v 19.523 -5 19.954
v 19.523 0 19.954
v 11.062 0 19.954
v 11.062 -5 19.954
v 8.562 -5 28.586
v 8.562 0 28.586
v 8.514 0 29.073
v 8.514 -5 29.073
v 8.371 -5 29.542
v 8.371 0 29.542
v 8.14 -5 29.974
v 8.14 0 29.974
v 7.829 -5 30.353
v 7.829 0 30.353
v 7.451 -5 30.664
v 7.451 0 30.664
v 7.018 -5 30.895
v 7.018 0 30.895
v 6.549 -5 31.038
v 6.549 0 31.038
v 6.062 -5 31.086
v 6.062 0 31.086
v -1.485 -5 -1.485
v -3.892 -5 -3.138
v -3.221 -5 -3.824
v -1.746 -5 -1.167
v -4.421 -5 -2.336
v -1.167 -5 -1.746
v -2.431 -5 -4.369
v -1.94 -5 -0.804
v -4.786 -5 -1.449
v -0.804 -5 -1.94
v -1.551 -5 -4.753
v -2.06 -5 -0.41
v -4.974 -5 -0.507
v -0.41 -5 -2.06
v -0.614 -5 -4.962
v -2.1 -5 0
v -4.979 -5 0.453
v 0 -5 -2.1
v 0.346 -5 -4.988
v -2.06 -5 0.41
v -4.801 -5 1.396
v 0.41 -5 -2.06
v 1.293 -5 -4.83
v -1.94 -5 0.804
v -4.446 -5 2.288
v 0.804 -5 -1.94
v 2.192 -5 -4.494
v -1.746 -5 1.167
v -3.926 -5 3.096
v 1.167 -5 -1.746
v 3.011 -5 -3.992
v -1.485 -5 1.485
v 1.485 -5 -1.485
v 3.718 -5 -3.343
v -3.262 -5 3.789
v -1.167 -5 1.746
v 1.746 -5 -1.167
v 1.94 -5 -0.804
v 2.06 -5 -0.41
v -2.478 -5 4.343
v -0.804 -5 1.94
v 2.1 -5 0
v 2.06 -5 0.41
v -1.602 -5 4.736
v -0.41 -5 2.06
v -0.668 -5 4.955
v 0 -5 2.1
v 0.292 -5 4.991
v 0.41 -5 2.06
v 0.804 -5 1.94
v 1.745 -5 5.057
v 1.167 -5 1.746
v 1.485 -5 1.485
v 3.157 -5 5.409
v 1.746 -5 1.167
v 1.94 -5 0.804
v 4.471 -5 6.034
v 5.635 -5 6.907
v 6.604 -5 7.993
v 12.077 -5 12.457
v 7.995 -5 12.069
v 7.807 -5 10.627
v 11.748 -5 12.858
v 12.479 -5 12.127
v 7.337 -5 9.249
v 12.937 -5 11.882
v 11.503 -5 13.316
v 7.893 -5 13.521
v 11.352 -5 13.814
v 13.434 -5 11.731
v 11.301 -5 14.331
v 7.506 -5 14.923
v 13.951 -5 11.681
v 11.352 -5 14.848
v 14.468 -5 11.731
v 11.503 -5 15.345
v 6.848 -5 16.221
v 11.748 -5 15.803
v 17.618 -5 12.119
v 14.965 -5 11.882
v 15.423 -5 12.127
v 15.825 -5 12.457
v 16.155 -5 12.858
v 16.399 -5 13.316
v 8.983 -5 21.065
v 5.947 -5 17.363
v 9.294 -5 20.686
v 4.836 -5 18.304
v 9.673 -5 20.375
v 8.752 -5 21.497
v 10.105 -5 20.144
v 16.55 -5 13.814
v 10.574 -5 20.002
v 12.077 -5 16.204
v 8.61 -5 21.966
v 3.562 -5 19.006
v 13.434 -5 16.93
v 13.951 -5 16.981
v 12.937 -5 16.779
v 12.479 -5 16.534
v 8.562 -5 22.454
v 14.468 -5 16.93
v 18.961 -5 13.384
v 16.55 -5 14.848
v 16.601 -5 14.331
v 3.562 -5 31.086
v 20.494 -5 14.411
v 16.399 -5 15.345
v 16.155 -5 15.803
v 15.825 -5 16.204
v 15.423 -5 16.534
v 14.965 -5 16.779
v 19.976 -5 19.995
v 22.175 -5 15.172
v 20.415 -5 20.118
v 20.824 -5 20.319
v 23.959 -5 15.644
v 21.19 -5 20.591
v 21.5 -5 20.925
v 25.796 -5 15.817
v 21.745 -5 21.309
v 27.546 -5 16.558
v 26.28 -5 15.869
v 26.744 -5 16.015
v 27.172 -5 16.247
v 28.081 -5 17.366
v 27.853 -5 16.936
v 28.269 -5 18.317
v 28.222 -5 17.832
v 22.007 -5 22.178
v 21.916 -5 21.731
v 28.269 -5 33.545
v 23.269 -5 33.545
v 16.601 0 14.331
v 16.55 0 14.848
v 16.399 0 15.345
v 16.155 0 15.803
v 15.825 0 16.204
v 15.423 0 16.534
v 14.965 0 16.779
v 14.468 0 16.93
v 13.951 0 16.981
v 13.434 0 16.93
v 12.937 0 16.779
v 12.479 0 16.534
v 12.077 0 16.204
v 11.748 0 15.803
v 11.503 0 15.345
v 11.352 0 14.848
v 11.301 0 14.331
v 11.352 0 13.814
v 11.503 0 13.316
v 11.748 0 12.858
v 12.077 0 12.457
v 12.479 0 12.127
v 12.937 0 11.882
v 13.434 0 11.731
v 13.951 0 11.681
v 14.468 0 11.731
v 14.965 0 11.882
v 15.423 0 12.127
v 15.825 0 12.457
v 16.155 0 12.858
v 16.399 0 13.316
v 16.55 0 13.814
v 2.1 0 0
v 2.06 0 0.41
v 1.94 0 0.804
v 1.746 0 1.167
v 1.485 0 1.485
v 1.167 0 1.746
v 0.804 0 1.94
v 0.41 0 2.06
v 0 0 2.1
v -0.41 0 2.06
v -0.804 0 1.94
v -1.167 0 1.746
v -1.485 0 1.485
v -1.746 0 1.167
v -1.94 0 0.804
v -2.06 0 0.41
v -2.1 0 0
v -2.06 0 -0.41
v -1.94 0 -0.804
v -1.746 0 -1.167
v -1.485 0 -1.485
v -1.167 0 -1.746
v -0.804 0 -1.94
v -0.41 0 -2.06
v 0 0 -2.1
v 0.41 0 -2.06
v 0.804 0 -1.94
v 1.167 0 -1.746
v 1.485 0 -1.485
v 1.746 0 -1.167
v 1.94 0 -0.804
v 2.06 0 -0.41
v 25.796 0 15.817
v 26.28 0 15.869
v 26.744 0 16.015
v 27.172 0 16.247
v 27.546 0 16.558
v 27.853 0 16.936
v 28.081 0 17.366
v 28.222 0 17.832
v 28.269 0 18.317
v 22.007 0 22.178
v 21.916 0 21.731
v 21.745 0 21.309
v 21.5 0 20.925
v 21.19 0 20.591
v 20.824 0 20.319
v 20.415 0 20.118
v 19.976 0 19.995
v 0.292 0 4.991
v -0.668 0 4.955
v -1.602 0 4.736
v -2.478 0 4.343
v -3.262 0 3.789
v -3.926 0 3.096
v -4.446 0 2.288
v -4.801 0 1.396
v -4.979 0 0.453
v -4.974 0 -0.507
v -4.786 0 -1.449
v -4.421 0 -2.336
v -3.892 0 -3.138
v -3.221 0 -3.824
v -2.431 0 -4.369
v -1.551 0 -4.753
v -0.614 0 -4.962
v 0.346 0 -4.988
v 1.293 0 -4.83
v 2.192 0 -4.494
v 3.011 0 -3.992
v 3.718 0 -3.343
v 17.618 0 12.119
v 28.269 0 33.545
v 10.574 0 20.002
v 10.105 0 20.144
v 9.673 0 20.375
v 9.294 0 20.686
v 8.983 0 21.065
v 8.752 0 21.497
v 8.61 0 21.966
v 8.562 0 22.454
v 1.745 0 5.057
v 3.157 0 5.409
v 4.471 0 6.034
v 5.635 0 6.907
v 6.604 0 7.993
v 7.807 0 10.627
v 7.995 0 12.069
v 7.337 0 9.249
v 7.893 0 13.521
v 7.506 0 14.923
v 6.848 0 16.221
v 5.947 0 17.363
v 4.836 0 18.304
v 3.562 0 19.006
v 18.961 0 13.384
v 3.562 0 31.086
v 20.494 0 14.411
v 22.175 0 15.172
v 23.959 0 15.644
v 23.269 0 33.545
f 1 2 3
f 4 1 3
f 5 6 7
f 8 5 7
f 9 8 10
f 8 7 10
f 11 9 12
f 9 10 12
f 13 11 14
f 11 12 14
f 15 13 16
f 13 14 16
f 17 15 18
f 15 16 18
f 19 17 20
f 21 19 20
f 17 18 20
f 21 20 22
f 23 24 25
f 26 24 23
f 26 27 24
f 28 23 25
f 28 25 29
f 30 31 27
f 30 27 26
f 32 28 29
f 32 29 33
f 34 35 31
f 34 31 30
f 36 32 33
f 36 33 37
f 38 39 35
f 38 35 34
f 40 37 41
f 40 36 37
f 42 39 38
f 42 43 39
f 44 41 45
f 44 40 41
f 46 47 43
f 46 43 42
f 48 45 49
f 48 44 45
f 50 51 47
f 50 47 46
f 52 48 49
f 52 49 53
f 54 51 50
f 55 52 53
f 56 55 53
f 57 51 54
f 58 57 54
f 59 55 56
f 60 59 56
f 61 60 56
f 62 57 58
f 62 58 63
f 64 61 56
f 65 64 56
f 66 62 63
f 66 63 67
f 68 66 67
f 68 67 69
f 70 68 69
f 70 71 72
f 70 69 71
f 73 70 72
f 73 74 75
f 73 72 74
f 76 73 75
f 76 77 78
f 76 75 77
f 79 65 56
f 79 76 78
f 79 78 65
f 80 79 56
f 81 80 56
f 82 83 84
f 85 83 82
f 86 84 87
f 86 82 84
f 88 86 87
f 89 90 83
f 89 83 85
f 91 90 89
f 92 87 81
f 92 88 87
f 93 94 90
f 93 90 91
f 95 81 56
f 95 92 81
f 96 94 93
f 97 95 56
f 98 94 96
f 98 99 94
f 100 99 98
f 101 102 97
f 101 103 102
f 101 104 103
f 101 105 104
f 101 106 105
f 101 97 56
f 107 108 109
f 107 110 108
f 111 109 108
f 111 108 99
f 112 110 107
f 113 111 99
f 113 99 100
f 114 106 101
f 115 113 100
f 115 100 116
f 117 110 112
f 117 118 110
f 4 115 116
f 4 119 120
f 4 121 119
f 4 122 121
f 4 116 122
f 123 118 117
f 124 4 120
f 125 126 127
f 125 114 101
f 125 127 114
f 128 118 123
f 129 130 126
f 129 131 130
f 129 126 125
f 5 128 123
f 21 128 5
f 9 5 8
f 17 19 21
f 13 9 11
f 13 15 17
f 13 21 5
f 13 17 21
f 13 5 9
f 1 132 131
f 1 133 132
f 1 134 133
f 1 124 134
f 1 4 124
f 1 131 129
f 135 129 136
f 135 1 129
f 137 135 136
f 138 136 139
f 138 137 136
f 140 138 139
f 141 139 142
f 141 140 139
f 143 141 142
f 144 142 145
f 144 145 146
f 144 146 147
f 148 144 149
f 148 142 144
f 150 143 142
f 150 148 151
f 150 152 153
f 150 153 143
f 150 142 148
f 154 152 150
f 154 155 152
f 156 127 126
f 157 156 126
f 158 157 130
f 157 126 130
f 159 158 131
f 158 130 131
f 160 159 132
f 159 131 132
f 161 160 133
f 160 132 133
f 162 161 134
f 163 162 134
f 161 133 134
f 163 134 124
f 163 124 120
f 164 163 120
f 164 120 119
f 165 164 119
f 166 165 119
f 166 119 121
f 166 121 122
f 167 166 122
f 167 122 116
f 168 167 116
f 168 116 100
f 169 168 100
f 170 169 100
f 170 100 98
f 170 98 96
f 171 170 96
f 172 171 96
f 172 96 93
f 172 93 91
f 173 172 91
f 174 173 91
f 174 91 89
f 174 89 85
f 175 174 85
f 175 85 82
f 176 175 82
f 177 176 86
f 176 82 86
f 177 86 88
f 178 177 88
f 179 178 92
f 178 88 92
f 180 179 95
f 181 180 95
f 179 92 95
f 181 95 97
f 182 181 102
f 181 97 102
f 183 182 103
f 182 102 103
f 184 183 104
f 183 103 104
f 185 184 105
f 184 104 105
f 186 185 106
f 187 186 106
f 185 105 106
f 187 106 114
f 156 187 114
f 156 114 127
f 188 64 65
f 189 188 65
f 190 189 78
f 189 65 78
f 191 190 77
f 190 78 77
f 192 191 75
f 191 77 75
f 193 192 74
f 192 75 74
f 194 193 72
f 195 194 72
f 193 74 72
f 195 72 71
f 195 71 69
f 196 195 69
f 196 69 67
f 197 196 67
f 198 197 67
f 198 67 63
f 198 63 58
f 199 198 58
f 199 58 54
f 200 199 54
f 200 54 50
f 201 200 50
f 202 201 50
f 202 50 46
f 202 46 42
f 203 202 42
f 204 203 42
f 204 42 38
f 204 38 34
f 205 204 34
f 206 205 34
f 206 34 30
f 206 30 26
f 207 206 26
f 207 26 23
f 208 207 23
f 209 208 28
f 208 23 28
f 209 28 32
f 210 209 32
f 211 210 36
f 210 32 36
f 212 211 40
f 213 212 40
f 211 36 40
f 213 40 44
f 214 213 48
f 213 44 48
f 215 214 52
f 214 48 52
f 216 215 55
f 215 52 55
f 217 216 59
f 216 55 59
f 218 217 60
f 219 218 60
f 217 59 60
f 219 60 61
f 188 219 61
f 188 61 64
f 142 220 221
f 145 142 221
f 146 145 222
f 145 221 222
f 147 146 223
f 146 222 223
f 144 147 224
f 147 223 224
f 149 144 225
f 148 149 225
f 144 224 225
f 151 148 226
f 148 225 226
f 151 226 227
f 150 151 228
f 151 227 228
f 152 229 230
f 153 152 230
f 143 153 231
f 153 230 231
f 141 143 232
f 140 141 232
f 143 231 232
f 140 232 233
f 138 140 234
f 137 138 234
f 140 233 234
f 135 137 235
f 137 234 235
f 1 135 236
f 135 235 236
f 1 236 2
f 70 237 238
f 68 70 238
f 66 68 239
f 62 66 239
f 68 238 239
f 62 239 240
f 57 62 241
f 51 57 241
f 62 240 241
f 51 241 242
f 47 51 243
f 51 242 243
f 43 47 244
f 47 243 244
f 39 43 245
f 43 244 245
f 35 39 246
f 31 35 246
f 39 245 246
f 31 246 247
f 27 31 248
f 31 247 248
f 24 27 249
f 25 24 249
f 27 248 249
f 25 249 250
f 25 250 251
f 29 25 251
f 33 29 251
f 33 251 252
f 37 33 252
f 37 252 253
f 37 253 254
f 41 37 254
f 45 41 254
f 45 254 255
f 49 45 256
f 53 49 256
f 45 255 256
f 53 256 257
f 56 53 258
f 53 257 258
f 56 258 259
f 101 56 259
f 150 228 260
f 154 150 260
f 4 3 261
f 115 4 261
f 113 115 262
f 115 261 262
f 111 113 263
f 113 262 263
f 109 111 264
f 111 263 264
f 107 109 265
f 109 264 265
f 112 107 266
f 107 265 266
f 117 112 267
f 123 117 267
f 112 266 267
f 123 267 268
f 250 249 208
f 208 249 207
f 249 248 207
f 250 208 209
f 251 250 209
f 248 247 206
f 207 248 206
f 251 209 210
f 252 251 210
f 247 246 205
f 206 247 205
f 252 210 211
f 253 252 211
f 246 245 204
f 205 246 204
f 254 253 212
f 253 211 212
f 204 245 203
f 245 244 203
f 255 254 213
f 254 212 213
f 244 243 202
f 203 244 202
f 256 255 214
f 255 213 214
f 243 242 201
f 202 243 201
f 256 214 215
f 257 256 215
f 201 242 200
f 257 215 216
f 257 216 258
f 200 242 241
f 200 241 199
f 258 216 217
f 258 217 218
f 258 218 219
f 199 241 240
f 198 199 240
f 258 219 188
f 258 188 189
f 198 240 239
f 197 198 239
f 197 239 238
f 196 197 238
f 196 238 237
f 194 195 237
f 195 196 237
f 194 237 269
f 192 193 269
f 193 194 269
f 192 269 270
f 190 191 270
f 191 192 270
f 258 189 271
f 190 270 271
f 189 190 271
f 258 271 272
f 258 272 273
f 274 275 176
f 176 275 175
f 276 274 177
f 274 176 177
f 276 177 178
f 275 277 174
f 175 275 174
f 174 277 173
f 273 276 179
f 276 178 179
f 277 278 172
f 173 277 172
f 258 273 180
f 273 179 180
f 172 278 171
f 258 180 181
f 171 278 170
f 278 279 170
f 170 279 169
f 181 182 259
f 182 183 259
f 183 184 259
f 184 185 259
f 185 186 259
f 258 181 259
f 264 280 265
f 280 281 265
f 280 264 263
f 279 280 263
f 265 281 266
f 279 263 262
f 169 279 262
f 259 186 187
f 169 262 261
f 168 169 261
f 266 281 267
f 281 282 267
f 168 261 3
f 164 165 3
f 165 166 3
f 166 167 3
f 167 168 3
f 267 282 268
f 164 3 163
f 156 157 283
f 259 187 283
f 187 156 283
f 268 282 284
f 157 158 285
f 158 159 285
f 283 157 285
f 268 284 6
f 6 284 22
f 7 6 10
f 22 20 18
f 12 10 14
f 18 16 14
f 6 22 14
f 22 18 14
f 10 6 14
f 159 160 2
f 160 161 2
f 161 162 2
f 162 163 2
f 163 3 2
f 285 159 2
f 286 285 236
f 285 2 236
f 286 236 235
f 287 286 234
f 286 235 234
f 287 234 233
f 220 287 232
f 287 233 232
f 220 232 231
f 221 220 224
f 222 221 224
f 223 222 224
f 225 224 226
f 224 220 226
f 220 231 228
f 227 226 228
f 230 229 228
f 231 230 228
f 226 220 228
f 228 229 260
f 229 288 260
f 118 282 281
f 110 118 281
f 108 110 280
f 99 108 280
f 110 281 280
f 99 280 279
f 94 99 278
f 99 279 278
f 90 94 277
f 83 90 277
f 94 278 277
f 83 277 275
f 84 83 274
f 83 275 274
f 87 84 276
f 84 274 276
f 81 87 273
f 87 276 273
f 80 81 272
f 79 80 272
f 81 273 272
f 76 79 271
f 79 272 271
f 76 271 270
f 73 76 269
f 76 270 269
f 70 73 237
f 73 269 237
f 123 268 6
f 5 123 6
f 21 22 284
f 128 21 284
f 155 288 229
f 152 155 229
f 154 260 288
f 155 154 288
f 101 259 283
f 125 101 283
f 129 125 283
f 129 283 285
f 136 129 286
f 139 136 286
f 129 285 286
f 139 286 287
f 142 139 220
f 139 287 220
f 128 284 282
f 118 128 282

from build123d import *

# Parameters (mm, degrees)
BOSS_EXTRUDE1_DEPTH  = 5
M5_CLEARANCE_HOLE1_D = 5.3
M5_TAPPED_HOLE1_D    = 4.2


with BuildPart() as part:
    # Sketch3 → Boss-Extrude1 (new body)
    with BuildSketch(Plane(origin=(0, 0, 0), x_dir=(-1, 0, 0), z_dir=(0, 1, 0))):
        with BuildLine():
            Line((-3.718320572, -3.342767136), (-17.618374366, 12.118930874))
            ThreePointArc((-17.618374366, 12.118930874), (-21.319064477, 14.826224184), (-25.796067121, 15.816674432))
            ThreePointArc((-25.796067121, 15.816674432), (-27.546375819, 16.558322133), (-28.269100189, 18.316528984))
            Line((-28.269100189, 18.316528984), (-28.269100189, 33.544684312))
            Line((-28.269100189, 33.544684312), (-23.269100189, 33.544684312))
            Line((-23.269100189, 33.544684312), (-22.007395686, 22.177884957))
            ThreePointArc((-22.007395686, 22.177884957), (-21.190062528, 20.590961046), (-19.522655818, 19.953688847))
            Line((-19.522655818, 19.953688847), (-11.061691266, 19.953688847))
            ThreePointArc((-11.061691266, 19.953688847), (-9.293924313, 20.685921894), (-8.561691266, 22.453688847))
            Line((-8.561691266, 22.453688847), (-8.561691266, 28.585543669))
            ThreePointArc((-8.561691266, 28.585543669), (-7.829458219, 30.353310622), (-6.061691266, 31.085543669))
            Line((-6.061691266, 31.085543669), (-3.561691266, 31.085543669))
            Line((-3.561691266, 31.085543669), (-3.561691266, 19.005709588))
            ThreePointArc((-3.561691266, 19.005709588), (-7.807339249, 10.626500654), (-0.291809826, 4.991477439))
            ThreePointArc((-0.291809826, 4.991477439), (4.624412894, -1.901264156), (-3.718320572, -3.342767136))
        make_face()
    extrude(amount=-BOSS_EXTRUDE1_DEPTH)

    # M5 Clearance Hole1 (through all)
    with Locations(Plane(origin=(0, 0, 0), x_dir=(-1, 0, 0), z_dir=(0, 1, 0))):
        with Locations((-13.951148511, 14.33057763)):
            Hole(M5_CLEARANCE_HOLE1_D / 2)

    # M5 Tapped Hole1 (through all)
    with Locations(Plane(origin=(0, 0, 0), x_dir=(-1, 0, 0), z_dir=(0, 1, 0))):
        with Locations((0, 0)):
            Hole(M5_TAPPED_HOLE1_D / 2)


solid = part.part
